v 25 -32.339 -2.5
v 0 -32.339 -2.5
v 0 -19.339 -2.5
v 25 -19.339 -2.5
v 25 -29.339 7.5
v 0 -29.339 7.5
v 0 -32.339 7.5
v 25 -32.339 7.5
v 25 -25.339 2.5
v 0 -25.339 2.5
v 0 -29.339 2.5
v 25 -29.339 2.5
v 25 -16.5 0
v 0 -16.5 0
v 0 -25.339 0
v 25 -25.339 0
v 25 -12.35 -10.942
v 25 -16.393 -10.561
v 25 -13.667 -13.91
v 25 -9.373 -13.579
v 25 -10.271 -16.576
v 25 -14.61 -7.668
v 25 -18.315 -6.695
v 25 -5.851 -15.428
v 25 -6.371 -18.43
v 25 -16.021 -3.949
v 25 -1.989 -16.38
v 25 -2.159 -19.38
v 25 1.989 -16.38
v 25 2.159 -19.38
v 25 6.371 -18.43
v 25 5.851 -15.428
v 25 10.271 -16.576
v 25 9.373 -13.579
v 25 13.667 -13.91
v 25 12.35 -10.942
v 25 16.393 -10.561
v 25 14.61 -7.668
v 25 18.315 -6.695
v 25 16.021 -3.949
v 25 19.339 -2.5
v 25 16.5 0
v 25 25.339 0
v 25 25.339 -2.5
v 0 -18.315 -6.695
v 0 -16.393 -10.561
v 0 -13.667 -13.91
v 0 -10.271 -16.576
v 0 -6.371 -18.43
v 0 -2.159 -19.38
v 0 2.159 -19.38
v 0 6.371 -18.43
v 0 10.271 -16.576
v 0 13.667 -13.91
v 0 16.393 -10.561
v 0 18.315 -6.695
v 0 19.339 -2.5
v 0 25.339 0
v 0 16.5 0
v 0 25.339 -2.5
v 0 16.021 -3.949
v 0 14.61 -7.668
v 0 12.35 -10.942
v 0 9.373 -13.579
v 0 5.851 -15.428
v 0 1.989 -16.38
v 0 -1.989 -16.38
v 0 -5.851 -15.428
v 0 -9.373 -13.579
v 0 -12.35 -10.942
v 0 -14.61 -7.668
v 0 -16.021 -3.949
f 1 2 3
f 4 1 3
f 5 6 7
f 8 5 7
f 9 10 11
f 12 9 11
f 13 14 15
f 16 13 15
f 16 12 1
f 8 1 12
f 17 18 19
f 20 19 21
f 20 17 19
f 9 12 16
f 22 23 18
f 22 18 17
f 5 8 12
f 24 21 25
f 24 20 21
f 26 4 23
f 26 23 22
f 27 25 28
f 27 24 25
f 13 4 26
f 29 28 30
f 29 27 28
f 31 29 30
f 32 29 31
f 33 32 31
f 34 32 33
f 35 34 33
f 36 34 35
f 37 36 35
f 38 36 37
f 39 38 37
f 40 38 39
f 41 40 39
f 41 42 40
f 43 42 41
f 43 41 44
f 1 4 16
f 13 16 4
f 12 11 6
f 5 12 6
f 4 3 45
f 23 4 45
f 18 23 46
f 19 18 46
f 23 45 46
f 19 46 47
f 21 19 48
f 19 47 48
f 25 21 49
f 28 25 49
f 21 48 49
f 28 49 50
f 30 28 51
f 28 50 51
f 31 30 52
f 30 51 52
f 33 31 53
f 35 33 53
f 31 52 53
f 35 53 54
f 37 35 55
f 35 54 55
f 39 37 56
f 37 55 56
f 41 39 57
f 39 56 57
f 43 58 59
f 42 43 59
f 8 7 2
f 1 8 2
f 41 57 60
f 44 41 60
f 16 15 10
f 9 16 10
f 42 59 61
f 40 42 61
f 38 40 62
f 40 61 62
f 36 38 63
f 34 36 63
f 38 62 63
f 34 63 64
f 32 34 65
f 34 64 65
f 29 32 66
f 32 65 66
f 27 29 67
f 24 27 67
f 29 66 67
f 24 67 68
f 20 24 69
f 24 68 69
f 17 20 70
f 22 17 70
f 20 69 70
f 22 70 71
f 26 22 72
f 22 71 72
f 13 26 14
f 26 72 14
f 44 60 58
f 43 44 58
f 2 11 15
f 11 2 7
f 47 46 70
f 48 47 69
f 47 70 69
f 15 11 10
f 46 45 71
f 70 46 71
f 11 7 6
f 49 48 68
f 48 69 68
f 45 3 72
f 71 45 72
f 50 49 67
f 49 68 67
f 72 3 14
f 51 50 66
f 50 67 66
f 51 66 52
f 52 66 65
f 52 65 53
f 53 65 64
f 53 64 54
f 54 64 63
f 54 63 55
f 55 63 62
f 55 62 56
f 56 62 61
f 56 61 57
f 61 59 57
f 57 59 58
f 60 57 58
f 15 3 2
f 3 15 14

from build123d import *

# Parameters (mm, degrees)
F1_DEPTH = 25


with BuildPart() as f1:
    # F0 (on Right) → F1 (new body)
    with BuildSketch(Plane.YZ):
        with BuildLine():
            Line((-29.33908, 7.5), (-32.33908, 7.5))
            Line((-32.33908, 7.5), (-32.33908, -2.5))
            Line((-32.33908, -2.5), (-19.33908, -2.5))
            ThreePointArc((-19.33908, -2.5), (0, -19.5), (19.33908, -2.5))
            Line((19.33908, -2.5), (25.33908, -2.5))
            Line((25.33908, -2.5), (25.33908, 0))
            Line((25.33908, 0), (16.5, 0))
            ThreePointArc((16.5, 0), (0, -16.5), (-16.5, 0))
            Line((-16.5, 0), (-25.33908, 0))
            Line((-25.33908, 0), (-25.33908, 2.5))
            Line((-25.33908, 2.5), (-29.33908, 2.5))
            Line((-29.33908, 2.5), (-29.33908, 7.5))
        make_face()
    extrude(amount=F1_DEPTH)


solid = f1.part
